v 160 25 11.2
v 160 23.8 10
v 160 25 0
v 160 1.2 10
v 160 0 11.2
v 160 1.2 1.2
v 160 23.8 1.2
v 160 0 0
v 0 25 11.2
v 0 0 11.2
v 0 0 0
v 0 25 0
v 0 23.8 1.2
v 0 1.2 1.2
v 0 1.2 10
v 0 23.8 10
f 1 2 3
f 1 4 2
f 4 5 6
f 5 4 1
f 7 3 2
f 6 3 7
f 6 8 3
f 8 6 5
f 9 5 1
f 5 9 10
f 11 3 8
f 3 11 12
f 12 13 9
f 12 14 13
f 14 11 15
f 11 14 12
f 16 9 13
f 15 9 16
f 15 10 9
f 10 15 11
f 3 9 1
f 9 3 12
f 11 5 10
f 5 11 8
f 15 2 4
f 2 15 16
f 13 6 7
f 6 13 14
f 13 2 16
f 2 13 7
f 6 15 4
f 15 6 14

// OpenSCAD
// ScienceClaw rectangular_tube; nominal millimeters. Printer process requires validation.
length = 160;
width = 25;
height = 11.2;
thickness = 1.2;
difference() { cube([length,width,height]); translate([-1, thickness, thickness]) cube([length+2, width-2*thickness, height-2*thickness]); }
